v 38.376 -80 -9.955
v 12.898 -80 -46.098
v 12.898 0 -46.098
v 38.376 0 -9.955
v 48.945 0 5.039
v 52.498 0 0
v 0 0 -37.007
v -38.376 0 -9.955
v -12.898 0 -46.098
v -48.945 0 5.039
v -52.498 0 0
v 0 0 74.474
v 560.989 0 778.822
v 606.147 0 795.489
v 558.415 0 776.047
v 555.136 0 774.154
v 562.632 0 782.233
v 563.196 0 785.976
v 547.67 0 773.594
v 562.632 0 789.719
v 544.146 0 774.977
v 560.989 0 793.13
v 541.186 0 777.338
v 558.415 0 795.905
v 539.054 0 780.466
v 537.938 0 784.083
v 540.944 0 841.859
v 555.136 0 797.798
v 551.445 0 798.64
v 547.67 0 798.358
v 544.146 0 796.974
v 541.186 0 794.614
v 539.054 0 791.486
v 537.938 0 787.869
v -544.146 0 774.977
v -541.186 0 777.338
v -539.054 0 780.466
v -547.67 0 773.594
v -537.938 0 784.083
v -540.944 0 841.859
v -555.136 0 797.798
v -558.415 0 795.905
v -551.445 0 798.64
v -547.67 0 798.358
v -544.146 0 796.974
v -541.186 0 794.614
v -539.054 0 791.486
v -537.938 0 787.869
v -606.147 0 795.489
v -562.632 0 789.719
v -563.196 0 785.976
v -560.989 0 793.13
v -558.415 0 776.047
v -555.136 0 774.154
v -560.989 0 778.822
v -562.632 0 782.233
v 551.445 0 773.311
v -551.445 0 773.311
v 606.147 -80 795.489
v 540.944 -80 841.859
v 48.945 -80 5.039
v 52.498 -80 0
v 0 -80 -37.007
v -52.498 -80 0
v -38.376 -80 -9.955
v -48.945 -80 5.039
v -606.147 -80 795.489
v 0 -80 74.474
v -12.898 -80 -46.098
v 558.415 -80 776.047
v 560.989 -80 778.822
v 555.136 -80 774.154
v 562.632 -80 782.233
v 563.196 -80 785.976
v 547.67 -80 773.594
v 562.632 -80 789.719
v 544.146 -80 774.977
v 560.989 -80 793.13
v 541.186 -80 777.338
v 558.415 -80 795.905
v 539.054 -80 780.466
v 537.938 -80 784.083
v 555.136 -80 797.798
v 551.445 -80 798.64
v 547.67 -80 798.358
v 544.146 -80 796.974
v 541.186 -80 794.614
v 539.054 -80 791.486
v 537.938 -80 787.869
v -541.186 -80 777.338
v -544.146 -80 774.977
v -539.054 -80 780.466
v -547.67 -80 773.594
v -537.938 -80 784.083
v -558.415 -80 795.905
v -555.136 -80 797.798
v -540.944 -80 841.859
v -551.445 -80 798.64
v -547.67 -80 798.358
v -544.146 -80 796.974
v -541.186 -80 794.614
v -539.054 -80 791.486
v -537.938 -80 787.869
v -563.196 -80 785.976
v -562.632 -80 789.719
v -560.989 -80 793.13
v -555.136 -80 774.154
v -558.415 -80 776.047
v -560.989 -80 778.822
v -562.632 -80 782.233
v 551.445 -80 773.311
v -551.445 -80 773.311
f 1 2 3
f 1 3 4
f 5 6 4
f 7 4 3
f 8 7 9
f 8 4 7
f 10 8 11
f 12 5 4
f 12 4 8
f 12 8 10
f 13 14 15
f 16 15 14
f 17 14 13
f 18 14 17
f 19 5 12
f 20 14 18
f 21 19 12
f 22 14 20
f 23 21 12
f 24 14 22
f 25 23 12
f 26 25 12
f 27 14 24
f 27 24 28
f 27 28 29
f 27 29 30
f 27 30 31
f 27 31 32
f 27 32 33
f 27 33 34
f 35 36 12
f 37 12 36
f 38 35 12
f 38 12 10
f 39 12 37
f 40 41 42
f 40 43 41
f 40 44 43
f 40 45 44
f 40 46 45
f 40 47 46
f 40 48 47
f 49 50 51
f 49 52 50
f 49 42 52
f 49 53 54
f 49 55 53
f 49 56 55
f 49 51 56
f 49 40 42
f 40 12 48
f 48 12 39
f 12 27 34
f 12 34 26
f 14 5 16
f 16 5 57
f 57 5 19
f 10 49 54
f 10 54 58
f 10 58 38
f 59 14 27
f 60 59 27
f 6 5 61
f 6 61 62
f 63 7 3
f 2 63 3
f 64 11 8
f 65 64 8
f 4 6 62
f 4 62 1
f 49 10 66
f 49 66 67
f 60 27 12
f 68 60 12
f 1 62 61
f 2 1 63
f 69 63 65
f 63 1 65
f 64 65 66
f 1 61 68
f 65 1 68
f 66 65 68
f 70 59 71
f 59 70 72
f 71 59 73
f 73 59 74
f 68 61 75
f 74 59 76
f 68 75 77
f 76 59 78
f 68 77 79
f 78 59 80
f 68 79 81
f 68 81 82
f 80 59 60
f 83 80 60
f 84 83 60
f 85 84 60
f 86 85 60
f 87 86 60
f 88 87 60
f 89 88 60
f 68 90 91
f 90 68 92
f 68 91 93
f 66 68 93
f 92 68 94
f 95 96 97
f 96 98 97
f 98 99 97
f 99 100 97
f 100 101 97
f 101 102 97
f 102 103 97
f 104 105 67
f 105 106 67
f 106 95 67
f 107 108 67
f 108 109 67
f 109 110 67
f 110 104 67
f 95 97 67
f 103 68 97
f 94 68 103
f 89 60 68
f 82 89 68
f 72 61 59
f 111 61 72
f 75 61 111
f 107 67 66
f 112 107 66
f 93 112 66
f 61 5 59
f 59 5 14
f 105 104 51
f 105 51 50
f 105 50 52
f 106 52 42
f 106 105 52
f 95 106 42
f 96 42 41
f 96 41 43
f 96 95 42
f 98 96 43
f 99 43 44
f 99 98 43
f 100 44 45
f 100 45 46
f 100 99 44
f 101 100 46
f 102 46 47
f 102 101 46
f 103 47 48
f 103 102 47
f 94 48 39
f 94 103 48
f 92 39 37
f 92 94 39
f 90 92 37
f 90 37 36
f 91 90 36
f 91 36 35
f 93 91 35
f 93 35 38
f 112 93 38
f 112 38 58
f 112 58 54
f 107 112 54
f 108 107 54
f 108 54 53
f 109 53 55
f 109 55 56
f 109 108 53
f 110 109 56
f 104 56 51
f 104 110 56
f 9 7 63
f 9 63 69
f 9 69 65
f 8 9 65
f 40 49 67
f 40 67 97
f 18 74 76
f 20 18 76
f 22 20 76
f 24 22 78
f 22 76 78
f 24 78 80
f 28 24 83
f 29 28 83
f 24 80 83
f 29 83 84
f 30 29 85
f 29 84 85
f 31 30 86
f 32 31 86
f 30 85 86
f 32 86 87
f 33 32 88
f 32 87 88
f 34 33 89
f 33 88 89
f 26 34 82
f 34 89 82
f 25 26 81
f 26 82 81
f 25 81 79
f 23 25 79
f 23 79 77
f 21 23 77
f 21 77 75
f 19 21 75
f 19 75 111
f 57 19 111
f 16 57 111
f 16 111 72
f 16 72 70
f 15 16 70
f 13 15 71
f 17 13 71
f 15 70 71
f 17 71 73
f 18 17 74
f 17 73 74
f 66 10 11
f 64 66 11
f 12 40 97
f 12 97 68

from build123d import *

# Parameters (mm, degrees)
F1_DEPTH = 80
F2_R     = 12.7
F3_DEPTH = 80


with BuildPart() as f1:
    # F0 (on Front) → F1 (new body)
    with BuildSketch(Plane.XZ):
        Polygon((540.943911, 841.859221), (-52.497789, 0), (12.897508, -46.098321), (606.147254, 795.488594), align=None)
    extrude(amount=F1_DEPTH)

    # F2 (on face) → F3 (cut, through all)
    with BuildSketch(Plane.XZ.offset(80)):
        with Locations((550.496222, 785.975975)):
            Circle(F2_R)
    extrude(amount=-F3_DEPTH, mode=Mode.SUBTRACT)

    # F4: F1 across plane


with BuildPart() as f1_1:
    add(f1.part)
    add(f1.part.mirror(Plane.YZ))


solid = f1_1.part
